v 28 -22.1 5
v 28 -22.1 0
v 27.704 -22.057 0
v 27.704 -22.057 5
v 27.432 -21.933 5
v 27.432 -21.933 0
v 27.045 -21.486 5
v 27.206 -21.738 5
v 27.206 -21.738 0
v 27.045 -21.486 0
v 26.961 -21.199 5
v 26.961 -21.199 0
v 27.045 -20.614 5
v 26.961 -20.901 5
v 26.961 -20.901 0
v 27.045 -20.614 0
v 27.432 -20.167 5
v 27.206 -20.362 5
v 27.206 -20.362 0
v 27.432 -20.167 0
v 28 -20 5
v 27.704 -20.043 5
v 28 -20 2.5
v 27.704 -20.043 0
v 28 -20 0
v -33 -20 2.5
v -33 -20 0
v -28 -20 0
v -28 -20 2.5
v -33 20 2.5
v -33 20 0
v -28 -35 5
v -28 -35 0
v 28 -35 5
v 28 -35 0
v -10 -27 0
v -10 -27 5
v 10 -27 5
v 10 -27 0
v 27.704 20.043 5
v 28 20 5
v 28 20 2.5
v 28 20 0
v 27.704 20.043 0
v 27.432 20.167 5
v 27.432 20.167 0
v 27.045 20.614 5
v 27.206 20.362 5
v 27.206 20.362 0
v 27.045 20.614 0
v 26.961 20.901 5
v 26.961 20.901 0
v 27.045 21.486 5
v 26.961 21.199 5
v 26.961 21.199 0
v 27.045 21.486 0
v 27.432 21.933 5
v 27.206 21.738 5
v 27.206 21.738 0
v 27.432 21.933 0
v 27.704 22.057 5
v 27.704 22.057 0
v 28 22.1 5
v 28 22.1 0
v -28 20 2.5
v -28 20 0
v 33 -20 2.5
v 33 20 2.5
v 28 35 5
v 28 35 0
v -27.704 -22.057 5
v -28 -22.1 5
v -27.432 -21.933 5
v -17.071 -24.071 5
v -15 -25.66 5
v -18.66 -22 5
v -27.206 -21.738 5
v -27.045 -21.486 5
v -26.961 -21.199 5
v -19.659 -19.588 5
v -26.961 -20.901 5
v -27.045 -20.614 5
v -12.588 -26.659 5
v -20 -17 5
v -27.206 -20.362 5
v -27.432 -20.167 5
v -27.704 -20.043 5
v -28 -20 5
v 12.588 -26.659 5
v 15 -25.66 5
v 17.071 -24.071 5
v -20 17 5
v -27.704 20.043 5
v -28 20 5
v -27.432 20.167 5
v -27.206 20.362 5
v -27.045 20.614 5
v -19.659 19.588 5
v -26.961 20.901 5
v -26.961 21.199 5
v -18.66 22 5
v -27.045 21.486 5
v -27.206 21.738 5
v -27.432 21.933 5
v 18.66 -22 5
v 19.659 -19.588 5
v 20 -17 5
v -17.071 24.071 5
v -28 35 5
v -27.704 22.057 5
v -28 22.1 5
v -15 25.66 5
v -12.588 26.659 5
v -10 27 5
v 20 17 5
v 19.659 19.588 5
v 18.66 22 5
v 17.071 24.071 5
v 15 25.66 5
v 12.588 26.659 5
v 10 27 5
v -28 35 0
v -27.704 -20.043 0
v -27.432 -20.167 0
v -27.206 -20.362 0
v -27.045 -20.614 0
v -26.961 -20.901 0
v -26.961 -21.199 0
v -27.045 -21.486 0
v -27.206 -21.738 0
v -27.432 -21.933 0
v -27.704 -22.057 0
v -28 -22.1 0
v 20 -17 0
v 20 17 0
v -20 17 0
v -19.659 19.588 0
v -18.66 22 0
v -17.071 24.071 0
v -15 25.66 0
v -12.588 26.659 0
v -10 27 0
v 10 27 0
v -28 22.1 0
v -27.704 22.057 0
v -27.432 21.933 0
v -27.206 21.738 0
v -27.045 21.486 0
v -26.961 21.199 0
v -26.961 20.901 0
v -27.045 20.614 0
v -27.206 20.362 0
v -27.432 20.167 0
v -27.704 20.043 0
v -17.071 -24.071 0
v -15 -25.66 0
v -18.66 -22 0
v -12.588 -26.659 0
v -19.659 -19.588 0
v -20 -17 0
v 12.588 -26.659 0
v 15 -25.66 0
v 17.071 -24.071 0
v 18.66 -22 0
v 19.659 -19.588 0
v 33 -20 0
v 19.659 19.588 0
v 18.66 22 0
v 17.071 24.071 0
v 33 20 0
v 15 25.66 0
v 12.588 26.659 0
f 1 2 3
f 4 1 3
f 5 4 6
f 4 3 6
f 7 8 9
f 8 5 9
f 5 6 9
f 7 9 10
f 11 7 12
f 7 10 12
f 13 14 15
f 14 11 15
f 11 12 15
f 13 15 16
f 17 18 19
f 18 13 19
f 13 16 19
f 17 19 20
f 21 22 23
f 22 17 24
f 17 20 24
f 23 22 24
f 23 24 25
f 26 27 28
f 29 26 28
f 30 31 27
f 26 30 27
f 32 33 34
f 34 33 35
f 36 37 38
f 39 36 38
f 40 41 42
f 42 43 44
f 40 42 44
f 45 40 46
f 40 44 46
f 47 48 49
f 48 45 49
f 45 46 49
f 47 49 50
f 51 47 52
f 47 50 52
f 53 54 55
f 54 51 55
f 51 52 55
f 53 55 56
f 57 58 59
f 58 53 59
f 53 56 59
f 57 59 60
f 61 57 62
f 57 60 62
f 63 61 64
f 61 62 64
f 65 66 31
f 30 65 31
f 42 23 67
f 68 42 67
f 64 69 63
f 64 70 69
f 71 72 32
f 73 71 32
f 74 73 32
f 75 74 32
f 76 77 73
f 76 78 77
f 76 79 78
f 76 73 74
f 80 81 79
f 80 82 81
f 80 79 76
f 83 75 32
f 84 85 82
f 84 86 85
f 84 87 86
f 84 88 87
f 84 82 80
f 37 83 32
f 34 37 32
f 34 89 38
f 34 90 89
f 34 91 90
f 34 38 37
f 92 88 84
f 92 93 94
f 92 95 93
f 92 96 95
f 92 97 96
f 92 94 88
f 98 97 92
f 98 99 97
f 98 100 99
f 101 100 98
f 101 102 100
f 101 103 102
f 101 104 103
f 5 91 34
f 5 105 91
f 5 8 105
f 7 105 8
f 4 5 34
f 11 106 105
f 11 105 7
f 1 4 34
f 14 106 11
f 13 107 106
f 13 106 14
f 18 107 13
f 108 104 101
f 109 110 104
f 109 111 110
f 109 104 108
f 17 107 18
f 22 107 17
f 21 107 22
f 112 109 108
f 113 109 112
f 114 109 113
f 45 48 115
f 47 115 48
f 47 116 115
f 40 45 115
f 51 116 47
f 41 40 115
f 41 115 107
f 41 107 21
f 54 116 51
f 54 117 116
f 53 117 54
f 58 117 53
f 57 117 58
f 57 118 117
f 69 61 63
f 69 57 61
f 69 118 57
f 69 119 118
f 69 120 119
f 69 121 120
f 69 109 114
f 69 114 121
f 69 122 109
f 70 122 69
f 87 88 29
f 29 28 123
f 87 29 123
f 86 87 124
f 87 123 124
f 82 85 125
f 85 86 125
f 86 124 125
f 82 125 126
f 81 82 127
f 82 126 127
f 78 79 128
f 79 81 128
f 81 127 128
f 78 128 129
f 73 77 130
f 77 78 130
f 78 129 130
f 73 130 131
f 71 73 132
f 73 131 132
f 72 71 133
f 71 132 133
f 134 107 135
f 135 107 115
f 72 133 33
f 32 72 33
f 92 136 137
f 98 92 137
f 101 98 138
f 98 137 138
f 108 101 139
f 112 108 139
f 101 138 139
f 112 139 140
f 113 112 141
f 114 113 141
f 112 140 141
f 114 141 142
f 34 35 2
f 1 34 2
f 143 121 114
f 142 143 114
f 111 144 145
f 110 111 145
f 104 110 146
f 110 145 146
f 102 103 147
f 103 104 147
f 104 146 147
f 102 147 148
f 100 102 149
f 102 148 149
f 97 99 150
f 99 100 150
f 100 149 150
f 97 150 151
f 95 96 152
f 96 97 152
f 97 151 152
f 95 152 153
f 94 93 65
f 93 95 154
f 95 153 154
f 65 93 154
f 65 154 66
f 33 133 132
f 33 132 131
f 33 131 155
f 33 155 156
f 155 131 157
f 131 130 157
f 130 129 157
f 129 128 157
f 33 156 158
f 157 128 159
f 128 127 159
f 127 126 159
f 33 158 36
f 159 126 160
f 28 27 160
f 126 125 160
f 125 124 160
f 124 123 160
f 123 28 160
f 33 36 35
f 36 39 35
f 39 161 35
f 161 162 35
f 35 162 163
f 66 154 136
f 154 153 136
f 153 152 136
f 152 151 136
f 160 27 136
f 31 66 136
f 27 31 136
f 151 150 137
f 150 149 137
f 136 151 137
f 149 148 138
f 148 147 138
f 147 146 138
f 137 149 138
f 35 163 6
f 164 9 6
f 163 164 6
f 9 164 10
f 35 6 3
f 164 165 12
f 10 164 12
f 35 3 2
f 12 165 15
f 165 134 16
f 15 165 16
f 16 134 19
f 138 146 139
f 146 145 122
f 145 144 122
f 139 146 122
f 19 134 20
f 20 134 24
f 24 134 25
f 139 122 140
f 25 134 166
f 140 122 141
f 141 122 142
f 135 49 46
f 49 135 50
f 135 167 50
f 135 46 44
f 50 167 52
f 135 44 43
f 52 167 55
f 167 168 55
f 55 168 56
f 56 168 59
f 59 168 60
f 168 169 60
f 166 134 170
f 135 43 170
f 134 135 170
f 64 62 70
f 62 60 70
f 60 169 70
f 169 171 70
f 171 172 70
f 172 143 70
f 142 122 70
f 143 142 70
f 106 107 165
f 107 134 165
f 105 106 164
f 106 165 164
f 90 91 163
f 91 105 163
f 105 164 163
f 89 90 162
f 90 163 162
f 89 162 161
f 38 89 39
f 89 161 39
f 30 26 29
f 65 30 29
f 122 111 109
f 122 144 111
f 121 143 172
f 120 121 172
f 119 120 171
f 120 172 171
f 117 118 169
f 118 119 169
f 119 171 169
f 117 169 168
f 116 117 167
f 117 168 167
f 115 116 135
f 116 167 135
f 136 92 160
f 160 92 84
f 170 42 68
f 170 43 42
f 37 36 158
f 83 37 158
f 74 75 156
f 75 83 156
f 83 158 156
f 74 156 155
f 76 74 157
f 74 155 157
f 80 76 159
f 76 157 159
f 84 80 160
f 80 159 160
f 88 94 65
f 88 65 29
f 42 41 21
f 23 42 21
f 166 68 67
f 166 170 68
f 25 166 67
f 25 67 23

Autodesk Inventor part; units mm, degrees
ref_plane "YZ Plane" through (0, 0, 0) normal (1, 0, 0) x (0, 1, 0)
ref_plane "XZ Plane" through (0, 0, 0) normal (0, 1, 0) x (-1, 0, 0)
ref_plane "XY Plane" through (0, 0, 0) normal (0, 0, 1) x (1, 0, 0)
sketch "スケッチ1" plane through (0, 0, 0) normal (0, 0, 1) x (1, 0, 0)
  line L0 (-28, -35) -> (28, -35) construction
  line L1 (28, -35) -> (28, 35) construction
  line L2 (28, 35) -> (-28, 35) construction
  line L3 (-28, 35) -> (-28, -35) construction
  line L4 (-28, -35) -> (28, 35) construction
  line L5 (28, -35) -> (-28, 35) construction
  line L6 (-28, 22.1) -> (-28, 35)
  line L7 (-28, 35) -> (28, 35)
  line L8 (28, 35) -> (28, 22.1)
  line L9 (-28, 20) -> (-33, 20)
  line L10 (-33, 20) -> (-33, -20)
  line L11 (-33, -20) -> (-28, -20)
  line L12 (-28, -22.1) -> (-28, -35)
  line L13 (-28, -35) -> (28, -35)
  line L14 (28, -35) -> (28, -22.1)
  line L15 (28, 20) -> (33, 20)
  line L16 (33, 20) -> (33, -20)
  line L17 (33, -20) -> (28, -20)
  arc A0 (-28, 20) -> (-28, 22.1) centre (-28, 21.05) ccw
  arc A1 (-28, -22.1) -> (-28, -20) centre (-28, -21.05) ccw
  arc A2 (28, -20) -> (28, -22.1) centre (28, -21.05) ccw
  line L18 (0, 0) -> (0, 35) construction
  line L19 (0, 0) -> (28, 0) construction
  arc A3 (28, 22.1) -> (28, 20) centre (28, 21.05) ccw
  dimension "d9" = 56
  dimension "d12" = 70
  dimension "d13" = 15
  dimension "d39" = 15
  dimension "d40" = 1.05
  dimension "d41" = 5
extrude "押し出し1" add sketch "スケッチ1" along normal blind 5
sketch "スケッチ2" plane through (0, 0, 5) normal (0, 0, 1) x (1, 0, 0)
  line L0 (-28, 35) -> (-28, 22.1) projected
  line L1 (28, 35) -> (-28, 35) projected
  line L2 (-67.7785, 43.014) -> (-28, 43.014)
  line L3 (-28, 43.014) -> (-28, -43.014)
  line L4 (-28, -43.014) -> (-67.7785, -43.014)
  line L5 (-67.7785, -43.014) -> (-67.7785, 43.014)
  line L6 (67.7785, 43.014) -> (28, 43.014)
  line L7 (28, 43.014) -> (28, -43.014)
  line L8 (28, -43.014) -> (67.7785, -43.014)
  line L9 (67.7785, -43.014) -> (67.7785, 43.014)
  line L10 (0, 0) -> (0, 35) construction
  line L11 (0, 0) -> (33, 0) construction
  line L12 (33, 20) -> (33, -20) construction
extrude "押し出し2" cut sketch "スケッチ2" against normal blind 2.5
sketch "スケッチ3" plane through (0, 0, 5) normal (0, 0, 1) x (1, 0, 0)
  line L0 (28, 35) -> (-28, 35) projected
  line L1 (-28, 35) -> (-28, 22.1) projected
  line L2 (-20, -27) -> (20, -27)
  line L3 (20, -27) -> (20, 27)
  line L4 (20, 27) -> (-20, 27)
  line L5 (-20, 27) -> (-20, -27)
  line L6 (-20, -27) -> (20, 27) construction
  line L7 (20, -27) -> (-20, 27) construction
  point P0 (0, 0)
  dimension "d47" = 8
  dimension "d48" = 8
extrude "押し出し3" cut sketch "スケッチ3" against normal blind 10
fillet "フィレット1" radius 10 4 edges at (-20, 27, 2.5) (20, 27, 2.5) (20, -27, 2.5) (-20, -27, 2.5)
equation "\"d12\" = d18"
equation "\"d13\" = d28"
equation "\"d39\" = d13"
equation "\"d47\" = d48"
equation "\"d18\" = 70"
equation "\"d28\" = 15"
properties part number "コックピット_2_サブフレーム_1" material "アセタール樹脂、黒"
